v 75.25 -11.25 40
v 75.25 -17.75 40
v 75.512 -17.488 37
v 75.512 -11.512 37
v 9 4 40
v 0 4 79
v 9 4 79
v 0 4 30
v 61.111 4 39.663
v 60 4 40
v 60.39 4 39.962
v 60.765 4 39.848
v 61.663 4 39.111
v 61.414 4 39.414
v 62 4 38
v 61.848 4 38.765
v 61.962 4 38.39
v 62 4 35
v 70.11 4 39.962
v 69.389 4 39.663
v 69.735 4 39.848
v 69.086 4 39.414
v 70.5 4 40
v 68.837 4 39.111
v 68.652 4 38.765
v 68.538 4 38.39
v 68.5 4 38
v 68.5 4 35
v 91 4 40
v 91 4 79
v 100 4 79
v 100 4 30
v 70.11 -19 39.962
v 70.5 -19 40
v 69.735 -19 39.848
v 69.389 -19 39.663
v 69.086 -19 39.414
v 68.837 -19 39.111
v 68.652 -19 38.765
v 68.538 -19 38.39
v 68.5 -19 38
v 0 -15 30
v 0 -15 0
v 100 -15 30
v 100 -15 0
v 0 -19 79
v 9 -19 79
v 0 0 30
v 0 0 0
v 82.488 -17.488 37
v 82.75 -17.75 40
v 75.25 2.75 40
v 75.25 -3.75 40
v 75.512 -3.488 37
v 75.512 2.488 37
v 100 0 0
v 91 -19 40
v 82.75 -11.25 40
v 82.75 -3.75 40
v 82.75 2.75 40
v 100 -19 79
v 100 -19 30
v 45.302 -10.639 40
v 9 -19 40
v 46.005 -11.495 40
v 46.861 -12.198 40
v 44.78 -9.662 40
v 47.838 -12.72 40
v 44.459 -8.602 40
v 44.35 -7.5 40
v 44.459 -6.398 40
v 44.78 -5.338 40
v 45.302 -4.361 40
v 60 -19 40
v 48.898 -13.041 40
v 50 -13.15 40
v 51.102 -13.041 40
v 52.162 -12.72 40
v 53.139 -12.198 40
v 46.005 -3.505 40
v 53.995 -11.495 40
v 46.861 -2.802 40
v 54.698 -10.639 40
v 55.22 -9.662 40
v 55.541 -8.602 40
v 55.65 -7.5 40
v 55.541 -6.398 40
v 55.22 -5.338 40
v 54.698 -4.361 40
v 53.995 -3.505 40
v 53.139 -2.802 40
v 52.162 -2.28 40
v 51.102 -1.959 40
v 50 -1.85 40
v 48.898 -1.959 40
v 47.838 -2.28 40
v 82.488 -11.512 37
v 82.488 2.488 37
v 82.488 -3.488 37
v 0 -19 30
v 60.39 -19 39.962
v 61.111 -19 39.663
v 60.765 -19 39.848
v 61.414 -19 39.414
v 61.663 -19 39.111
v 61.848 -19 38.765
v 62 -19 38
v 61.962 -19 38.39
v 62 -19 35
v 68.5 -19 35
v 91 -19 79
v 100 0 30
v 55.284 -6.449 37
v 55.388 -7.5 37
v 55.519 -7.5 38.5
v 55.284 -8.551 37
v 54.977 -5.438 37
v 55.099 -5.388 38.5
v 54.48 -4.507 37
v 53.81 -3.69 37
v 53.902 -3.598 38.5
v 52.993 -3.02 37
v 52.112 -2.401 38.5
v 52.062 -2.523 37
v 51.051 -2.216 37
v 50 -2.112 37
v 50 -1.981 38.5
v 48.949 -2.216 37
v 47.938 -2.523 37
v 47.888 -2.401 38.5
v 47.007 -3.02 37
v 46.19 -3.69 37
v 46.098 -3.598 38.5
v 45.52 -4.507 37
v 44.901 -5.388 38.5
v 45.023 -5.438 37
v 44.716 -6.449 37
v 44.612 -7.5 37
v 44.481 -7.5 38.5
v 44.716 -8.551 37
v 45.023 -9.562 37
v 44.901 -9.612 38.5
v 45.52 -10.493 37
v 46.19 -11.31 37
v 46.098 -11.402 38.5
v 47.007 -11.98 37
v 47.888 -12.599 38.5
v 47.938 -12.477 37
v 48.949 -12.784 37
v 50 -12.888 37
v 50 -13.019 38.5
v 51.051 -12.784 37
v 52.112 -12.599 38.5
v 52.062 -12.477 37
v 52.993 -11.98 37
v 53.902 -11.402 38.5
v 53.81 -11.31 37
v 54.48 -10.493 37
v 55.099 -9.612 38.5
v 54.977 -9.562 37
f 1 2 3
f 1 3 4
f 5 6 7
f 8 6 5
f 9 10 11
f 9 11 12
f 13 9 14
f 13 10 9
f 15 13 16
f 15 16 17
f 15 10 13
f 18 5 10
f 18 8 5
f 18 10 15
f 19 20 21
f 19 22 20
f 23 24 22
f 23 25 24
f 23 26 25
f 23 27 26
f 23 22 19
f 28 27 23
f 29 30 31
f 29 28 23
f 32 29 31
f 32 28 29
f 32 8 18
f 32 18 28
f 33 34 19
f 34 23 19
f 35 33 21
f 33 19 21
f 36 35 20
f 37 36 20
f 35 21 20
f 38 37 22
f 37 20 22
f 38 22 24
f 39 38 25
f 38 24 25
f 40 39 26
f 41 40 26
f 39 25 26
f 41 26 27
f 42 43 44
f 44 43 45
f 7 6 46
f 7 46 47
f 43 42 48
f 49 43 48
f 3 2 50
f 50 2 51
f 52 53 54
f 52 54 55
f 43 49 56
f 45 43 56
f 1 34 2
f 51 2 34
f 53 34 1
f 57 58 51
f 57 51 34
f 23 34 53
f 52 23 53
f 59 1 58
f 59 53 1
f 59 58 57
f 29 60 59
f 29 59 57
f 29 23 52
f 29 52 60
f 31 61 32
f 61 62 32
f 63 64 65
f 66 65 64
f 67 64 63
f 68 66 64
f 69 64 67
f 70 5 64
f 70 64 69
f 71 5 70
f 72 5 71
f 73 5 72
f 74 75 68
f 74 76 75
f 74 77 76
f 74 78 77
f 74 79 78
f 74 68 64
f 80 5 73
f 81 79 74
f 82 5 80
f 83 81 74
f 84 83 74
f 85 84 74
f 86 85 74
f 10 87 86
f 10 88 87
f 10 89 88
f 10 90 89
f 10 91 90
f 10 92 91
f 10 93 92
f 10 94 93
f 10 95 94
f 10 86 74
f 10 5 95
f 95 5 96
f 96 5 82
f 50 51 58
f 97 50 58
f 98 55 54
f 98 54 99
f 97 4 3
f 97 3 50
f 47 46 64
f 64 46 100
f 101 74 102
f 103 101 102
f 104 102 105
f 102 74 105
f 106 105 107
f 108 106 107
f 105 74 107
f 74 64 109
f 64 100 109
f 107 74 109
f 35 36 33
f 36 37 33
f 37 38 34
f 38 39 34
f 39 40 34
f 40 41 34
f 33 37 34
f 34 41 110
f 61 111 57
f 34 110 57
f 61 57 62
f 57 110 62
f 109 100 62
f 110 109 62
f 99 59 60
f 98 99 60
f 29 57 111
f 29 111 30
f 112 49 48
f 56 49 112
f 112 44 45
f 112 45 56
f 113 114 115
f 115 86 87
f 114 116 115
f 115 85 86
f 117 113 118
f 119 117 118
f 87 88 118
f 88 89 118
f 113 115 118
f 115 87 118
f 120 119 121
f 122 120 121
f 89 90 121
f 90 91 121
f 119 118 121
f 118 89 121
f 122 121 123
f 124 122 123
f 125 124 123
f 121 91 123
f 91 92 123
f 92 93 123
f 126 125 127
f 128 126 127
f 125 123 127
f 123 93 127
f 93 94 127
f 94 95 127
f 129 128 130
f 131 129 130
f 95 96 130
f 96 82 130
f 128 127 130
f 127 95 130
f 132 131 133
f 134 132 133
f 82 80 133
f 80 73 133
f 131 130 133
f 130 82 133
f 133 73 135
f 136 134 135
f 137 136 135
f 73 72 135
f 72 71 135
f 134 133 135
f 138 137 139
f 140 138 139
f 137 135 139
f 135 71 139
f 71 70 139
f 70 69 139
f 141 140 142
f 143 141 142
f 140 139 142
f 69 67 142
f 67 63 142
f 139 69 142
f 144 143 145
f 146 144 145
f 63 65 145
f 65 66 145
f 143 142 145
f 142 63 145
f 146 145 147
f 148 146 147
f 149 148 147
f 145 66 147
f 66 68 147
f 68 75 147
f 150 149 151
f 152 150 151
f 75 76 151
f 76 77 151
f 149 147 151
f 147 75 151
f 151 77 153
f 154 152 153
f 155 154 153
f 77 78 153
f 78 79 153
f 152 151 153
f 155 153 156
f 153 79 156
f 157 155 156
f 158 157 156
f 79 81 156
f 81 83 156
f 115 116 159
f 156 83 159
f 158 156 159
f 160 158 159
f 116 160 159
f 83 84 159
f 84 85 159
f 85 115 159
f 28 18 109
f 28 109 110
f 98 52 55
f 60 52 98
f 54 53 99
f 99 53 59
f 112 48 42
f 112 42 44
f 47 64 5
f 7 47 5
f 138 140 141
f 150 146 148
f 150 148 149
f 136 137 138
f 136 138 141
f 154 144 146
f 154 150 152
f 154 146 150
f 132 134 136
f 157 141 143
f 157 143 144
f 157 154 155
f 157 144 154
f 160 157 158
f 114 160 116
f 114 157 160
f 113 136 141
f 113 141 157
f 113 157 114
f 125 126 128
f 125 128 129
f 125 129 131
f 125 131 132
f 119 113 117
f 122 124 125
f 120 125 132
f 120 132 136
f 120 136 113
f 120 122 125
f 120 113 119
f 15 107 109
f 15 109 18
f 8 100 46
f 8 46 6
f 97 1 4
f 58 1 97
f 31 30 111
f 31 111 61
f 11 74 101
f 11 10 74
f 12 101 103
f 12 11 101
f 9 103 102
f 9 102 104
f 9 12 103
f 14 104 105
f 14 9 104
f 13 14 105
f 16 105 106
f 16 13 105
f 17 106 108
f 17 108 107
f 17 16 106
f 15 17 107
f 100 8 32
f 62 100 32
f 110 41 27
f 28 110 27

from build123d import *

# Parameters (mm, degrees)
SKETCH1_W                 = 100
SKETCH1_H                 = 15
CARRIAGE_BOTTOM_DEPTH     = 30
SKETCH2_W                 = 100
SKETCH2_H                 = 23
PLEXI_STAND_DEPTH         = 10
SKETCH8_W                 = 6.5
SKETCH8_H                 = 23
HOLE_FOR_WIRES_DEPTH      = 5
FILLET1_R                 = 2
SKETCH9_W                 = 9
SKETCH9_H                 = 23
BRACKET_HOLDERS_DEPTH     = 39
SKETCH10_R                = 5.65
FIT_HOLES_DEPTH           = 3
FIT_HOLES_DRAFT           = -5
SKETCH10_W                = 7.5
SKETCH10_H                = 6.5
FIT_HOLES_PROFILE_2_DEPTH = 3
FIT_HOLES_PROFILE_2_DRAFT = -5
FIT_HOLES_PROFILE_3_DEPTH = 3
FIT_HOLES_PROFILE_3_DRAFT = -5


with BuildPart() as part:
    # Sketch1 → carriage bottom (new body)
    with BuildSketch(Plane.XY):
        with Locations((50, -7.5)):
            Rectangle(SKETCH1_W, SKETCH1_H)
    extrude(amount=CARRIAGE_BOTTOM_DEPTH)


with BuildPart() as body_2:
    # Sketch2 → plexi stand (new body)
    with BuildSketch(Plane.XY.offset(30)):
        with Locations((50, -7.5)):
            Rectangle(SKETCH2_W, SKETCH2_H)
    extrude(amount=PLEXI_STAND_DEPTH)

    # Sketch8 → hole for wires (cut)
    with BuildSketch(Plane.XY.offset(40)):
        with Locations((65.25, -7.5)):
            Rectangle(SKETCH8_W, SKETCH8_H)
    extrude(amount=-HOLE_FOR_WIRES_DEPTH, mode=Mode.SUBTRACT)

    # Fillet1
    fillet1_edges = [body_2.edges().sort_by_distance(p)[0] for p in [
        (68.5, -7.5, 40),
        (62, -7.5, 40),
    ]]
    fillet(fillet1_edges, radius=FILLET1_R)

    # Sketch9 → bracket holders (add)
    with BuildSketch(Plane.XY.offset(40)):
        with Locations((95.5, -7.5)):
            Rectangle(SKETCH9_W, SKETCH9_H)
        with Locations((4.5, -7.5)):
            Rectangle(SKETCH9_W, SKETCH9_H)
    extrude(amount=BRACKET_HOLDERS_DEPTH)


with BuildPart() as fit_holes_tool:
    # Sketch10 → fit holes (with draft: the straight prism first)
    with BuildSketch(Plane.XY.offset(40)):
        with Locations((50, -7.5)):
            Circle(SKETCH10_R)
    extrude(amount=-FIT_HOLES_DEPTH)
    # fit holes: the draft: its side faces are tilted about the plane it starts from
    fit_holes_sides = [fit_holes_tool.faces().sort_by_distance(p)[0] for p in [
        (44.35, -7.5, 38.5),
    ]]
    draft(fit_holes_sides, Plane.XY.offset(40), FIT_HOLES_DRAFT)


with BuildPart() as body_2_1:
    add(body_2.part)

    # fit holes: cut by fit_holes_tool
    add(fit_holes_tool.part, mode=Mode.SUBTRACT)


with BuildPart() as fit_holes_profile_2_tool:
    # Sketch10 → fit holes profile 2 (with draft: the straight prism first)
    with BuildSketch(Plane.XY.offset(40)):
        with Locations((79, -14.5)):
            Rectangle(SKETCH10_W, SKETCH10_H)
    extrude(amount=-FIT_HOLES_PROFILE_2_DEPTH)
    # fit holes profile 2: the draft: its side faces are tilted about the plane it starts from
    fit_holes_profile_2_sides = [fit_holes_profile_2_tool.faces().sort_by_distance(p)[0] for p in [
        (79, -17.75, 38.5),
        (82.75, -14.5, 38.5),
        (79, -11.25, 38.5),
        (75.25, -14.5, 38.5),
    ]]
    draft(fit_holes_profile_2_sides, Plane.XY.offset(40), FIT_HOLES_PROFILE_2_DRAFT)


with BuildPart() as body_2_2:
    add(body_2_1.part)

    # fit holes profile 2: cut by fit_holes_profile_2_tool
    add(fit_holes_profile_2_tool.part, mode=Mode.SUBTRACT)


with BuildPart() as fit_holes_profile_3_tool:
    # Sketch10 → fit holes profile 3 (with draft: the straight prism first)
    with BuildSketch(Plane.XY.offset(40)):
        with Locations((79, -0.5)):
            Rectangle(SKETCH10_W, SKETCH10_H)
    extrude(amount=-FIT_HOLES_PROFILE_3_DEPTH)
    # fit holes profile 3: the draft: its side faces are tilted about the plane it starts from
    fit_holes_profile_3_sides = [fit_holes_profile_3_tool.faces().sort_by_distance(p)[0] for p in [
        (79, -3.75, 38.5),
        (82.75, -0.5, 38.5),
        (79, 2.75, 38.5),
        (75.25, -0.5, 38.5),
    ]]
    draft(fit_holes_profile_3_sides, Plane.XY.offset(40), FIT_HOLES_PROFILE_3_DRAFT)


with BuildPart() as body_2_3:
    add(body_2_2.part)

    # fit holes profile 3: cut by fit_holes_profile_3_tool
    add(fit_holes_profile_3_tool.part, mode=Mode.SUBTRACT)


solid = Compound([part.part, body_2_3.part])
